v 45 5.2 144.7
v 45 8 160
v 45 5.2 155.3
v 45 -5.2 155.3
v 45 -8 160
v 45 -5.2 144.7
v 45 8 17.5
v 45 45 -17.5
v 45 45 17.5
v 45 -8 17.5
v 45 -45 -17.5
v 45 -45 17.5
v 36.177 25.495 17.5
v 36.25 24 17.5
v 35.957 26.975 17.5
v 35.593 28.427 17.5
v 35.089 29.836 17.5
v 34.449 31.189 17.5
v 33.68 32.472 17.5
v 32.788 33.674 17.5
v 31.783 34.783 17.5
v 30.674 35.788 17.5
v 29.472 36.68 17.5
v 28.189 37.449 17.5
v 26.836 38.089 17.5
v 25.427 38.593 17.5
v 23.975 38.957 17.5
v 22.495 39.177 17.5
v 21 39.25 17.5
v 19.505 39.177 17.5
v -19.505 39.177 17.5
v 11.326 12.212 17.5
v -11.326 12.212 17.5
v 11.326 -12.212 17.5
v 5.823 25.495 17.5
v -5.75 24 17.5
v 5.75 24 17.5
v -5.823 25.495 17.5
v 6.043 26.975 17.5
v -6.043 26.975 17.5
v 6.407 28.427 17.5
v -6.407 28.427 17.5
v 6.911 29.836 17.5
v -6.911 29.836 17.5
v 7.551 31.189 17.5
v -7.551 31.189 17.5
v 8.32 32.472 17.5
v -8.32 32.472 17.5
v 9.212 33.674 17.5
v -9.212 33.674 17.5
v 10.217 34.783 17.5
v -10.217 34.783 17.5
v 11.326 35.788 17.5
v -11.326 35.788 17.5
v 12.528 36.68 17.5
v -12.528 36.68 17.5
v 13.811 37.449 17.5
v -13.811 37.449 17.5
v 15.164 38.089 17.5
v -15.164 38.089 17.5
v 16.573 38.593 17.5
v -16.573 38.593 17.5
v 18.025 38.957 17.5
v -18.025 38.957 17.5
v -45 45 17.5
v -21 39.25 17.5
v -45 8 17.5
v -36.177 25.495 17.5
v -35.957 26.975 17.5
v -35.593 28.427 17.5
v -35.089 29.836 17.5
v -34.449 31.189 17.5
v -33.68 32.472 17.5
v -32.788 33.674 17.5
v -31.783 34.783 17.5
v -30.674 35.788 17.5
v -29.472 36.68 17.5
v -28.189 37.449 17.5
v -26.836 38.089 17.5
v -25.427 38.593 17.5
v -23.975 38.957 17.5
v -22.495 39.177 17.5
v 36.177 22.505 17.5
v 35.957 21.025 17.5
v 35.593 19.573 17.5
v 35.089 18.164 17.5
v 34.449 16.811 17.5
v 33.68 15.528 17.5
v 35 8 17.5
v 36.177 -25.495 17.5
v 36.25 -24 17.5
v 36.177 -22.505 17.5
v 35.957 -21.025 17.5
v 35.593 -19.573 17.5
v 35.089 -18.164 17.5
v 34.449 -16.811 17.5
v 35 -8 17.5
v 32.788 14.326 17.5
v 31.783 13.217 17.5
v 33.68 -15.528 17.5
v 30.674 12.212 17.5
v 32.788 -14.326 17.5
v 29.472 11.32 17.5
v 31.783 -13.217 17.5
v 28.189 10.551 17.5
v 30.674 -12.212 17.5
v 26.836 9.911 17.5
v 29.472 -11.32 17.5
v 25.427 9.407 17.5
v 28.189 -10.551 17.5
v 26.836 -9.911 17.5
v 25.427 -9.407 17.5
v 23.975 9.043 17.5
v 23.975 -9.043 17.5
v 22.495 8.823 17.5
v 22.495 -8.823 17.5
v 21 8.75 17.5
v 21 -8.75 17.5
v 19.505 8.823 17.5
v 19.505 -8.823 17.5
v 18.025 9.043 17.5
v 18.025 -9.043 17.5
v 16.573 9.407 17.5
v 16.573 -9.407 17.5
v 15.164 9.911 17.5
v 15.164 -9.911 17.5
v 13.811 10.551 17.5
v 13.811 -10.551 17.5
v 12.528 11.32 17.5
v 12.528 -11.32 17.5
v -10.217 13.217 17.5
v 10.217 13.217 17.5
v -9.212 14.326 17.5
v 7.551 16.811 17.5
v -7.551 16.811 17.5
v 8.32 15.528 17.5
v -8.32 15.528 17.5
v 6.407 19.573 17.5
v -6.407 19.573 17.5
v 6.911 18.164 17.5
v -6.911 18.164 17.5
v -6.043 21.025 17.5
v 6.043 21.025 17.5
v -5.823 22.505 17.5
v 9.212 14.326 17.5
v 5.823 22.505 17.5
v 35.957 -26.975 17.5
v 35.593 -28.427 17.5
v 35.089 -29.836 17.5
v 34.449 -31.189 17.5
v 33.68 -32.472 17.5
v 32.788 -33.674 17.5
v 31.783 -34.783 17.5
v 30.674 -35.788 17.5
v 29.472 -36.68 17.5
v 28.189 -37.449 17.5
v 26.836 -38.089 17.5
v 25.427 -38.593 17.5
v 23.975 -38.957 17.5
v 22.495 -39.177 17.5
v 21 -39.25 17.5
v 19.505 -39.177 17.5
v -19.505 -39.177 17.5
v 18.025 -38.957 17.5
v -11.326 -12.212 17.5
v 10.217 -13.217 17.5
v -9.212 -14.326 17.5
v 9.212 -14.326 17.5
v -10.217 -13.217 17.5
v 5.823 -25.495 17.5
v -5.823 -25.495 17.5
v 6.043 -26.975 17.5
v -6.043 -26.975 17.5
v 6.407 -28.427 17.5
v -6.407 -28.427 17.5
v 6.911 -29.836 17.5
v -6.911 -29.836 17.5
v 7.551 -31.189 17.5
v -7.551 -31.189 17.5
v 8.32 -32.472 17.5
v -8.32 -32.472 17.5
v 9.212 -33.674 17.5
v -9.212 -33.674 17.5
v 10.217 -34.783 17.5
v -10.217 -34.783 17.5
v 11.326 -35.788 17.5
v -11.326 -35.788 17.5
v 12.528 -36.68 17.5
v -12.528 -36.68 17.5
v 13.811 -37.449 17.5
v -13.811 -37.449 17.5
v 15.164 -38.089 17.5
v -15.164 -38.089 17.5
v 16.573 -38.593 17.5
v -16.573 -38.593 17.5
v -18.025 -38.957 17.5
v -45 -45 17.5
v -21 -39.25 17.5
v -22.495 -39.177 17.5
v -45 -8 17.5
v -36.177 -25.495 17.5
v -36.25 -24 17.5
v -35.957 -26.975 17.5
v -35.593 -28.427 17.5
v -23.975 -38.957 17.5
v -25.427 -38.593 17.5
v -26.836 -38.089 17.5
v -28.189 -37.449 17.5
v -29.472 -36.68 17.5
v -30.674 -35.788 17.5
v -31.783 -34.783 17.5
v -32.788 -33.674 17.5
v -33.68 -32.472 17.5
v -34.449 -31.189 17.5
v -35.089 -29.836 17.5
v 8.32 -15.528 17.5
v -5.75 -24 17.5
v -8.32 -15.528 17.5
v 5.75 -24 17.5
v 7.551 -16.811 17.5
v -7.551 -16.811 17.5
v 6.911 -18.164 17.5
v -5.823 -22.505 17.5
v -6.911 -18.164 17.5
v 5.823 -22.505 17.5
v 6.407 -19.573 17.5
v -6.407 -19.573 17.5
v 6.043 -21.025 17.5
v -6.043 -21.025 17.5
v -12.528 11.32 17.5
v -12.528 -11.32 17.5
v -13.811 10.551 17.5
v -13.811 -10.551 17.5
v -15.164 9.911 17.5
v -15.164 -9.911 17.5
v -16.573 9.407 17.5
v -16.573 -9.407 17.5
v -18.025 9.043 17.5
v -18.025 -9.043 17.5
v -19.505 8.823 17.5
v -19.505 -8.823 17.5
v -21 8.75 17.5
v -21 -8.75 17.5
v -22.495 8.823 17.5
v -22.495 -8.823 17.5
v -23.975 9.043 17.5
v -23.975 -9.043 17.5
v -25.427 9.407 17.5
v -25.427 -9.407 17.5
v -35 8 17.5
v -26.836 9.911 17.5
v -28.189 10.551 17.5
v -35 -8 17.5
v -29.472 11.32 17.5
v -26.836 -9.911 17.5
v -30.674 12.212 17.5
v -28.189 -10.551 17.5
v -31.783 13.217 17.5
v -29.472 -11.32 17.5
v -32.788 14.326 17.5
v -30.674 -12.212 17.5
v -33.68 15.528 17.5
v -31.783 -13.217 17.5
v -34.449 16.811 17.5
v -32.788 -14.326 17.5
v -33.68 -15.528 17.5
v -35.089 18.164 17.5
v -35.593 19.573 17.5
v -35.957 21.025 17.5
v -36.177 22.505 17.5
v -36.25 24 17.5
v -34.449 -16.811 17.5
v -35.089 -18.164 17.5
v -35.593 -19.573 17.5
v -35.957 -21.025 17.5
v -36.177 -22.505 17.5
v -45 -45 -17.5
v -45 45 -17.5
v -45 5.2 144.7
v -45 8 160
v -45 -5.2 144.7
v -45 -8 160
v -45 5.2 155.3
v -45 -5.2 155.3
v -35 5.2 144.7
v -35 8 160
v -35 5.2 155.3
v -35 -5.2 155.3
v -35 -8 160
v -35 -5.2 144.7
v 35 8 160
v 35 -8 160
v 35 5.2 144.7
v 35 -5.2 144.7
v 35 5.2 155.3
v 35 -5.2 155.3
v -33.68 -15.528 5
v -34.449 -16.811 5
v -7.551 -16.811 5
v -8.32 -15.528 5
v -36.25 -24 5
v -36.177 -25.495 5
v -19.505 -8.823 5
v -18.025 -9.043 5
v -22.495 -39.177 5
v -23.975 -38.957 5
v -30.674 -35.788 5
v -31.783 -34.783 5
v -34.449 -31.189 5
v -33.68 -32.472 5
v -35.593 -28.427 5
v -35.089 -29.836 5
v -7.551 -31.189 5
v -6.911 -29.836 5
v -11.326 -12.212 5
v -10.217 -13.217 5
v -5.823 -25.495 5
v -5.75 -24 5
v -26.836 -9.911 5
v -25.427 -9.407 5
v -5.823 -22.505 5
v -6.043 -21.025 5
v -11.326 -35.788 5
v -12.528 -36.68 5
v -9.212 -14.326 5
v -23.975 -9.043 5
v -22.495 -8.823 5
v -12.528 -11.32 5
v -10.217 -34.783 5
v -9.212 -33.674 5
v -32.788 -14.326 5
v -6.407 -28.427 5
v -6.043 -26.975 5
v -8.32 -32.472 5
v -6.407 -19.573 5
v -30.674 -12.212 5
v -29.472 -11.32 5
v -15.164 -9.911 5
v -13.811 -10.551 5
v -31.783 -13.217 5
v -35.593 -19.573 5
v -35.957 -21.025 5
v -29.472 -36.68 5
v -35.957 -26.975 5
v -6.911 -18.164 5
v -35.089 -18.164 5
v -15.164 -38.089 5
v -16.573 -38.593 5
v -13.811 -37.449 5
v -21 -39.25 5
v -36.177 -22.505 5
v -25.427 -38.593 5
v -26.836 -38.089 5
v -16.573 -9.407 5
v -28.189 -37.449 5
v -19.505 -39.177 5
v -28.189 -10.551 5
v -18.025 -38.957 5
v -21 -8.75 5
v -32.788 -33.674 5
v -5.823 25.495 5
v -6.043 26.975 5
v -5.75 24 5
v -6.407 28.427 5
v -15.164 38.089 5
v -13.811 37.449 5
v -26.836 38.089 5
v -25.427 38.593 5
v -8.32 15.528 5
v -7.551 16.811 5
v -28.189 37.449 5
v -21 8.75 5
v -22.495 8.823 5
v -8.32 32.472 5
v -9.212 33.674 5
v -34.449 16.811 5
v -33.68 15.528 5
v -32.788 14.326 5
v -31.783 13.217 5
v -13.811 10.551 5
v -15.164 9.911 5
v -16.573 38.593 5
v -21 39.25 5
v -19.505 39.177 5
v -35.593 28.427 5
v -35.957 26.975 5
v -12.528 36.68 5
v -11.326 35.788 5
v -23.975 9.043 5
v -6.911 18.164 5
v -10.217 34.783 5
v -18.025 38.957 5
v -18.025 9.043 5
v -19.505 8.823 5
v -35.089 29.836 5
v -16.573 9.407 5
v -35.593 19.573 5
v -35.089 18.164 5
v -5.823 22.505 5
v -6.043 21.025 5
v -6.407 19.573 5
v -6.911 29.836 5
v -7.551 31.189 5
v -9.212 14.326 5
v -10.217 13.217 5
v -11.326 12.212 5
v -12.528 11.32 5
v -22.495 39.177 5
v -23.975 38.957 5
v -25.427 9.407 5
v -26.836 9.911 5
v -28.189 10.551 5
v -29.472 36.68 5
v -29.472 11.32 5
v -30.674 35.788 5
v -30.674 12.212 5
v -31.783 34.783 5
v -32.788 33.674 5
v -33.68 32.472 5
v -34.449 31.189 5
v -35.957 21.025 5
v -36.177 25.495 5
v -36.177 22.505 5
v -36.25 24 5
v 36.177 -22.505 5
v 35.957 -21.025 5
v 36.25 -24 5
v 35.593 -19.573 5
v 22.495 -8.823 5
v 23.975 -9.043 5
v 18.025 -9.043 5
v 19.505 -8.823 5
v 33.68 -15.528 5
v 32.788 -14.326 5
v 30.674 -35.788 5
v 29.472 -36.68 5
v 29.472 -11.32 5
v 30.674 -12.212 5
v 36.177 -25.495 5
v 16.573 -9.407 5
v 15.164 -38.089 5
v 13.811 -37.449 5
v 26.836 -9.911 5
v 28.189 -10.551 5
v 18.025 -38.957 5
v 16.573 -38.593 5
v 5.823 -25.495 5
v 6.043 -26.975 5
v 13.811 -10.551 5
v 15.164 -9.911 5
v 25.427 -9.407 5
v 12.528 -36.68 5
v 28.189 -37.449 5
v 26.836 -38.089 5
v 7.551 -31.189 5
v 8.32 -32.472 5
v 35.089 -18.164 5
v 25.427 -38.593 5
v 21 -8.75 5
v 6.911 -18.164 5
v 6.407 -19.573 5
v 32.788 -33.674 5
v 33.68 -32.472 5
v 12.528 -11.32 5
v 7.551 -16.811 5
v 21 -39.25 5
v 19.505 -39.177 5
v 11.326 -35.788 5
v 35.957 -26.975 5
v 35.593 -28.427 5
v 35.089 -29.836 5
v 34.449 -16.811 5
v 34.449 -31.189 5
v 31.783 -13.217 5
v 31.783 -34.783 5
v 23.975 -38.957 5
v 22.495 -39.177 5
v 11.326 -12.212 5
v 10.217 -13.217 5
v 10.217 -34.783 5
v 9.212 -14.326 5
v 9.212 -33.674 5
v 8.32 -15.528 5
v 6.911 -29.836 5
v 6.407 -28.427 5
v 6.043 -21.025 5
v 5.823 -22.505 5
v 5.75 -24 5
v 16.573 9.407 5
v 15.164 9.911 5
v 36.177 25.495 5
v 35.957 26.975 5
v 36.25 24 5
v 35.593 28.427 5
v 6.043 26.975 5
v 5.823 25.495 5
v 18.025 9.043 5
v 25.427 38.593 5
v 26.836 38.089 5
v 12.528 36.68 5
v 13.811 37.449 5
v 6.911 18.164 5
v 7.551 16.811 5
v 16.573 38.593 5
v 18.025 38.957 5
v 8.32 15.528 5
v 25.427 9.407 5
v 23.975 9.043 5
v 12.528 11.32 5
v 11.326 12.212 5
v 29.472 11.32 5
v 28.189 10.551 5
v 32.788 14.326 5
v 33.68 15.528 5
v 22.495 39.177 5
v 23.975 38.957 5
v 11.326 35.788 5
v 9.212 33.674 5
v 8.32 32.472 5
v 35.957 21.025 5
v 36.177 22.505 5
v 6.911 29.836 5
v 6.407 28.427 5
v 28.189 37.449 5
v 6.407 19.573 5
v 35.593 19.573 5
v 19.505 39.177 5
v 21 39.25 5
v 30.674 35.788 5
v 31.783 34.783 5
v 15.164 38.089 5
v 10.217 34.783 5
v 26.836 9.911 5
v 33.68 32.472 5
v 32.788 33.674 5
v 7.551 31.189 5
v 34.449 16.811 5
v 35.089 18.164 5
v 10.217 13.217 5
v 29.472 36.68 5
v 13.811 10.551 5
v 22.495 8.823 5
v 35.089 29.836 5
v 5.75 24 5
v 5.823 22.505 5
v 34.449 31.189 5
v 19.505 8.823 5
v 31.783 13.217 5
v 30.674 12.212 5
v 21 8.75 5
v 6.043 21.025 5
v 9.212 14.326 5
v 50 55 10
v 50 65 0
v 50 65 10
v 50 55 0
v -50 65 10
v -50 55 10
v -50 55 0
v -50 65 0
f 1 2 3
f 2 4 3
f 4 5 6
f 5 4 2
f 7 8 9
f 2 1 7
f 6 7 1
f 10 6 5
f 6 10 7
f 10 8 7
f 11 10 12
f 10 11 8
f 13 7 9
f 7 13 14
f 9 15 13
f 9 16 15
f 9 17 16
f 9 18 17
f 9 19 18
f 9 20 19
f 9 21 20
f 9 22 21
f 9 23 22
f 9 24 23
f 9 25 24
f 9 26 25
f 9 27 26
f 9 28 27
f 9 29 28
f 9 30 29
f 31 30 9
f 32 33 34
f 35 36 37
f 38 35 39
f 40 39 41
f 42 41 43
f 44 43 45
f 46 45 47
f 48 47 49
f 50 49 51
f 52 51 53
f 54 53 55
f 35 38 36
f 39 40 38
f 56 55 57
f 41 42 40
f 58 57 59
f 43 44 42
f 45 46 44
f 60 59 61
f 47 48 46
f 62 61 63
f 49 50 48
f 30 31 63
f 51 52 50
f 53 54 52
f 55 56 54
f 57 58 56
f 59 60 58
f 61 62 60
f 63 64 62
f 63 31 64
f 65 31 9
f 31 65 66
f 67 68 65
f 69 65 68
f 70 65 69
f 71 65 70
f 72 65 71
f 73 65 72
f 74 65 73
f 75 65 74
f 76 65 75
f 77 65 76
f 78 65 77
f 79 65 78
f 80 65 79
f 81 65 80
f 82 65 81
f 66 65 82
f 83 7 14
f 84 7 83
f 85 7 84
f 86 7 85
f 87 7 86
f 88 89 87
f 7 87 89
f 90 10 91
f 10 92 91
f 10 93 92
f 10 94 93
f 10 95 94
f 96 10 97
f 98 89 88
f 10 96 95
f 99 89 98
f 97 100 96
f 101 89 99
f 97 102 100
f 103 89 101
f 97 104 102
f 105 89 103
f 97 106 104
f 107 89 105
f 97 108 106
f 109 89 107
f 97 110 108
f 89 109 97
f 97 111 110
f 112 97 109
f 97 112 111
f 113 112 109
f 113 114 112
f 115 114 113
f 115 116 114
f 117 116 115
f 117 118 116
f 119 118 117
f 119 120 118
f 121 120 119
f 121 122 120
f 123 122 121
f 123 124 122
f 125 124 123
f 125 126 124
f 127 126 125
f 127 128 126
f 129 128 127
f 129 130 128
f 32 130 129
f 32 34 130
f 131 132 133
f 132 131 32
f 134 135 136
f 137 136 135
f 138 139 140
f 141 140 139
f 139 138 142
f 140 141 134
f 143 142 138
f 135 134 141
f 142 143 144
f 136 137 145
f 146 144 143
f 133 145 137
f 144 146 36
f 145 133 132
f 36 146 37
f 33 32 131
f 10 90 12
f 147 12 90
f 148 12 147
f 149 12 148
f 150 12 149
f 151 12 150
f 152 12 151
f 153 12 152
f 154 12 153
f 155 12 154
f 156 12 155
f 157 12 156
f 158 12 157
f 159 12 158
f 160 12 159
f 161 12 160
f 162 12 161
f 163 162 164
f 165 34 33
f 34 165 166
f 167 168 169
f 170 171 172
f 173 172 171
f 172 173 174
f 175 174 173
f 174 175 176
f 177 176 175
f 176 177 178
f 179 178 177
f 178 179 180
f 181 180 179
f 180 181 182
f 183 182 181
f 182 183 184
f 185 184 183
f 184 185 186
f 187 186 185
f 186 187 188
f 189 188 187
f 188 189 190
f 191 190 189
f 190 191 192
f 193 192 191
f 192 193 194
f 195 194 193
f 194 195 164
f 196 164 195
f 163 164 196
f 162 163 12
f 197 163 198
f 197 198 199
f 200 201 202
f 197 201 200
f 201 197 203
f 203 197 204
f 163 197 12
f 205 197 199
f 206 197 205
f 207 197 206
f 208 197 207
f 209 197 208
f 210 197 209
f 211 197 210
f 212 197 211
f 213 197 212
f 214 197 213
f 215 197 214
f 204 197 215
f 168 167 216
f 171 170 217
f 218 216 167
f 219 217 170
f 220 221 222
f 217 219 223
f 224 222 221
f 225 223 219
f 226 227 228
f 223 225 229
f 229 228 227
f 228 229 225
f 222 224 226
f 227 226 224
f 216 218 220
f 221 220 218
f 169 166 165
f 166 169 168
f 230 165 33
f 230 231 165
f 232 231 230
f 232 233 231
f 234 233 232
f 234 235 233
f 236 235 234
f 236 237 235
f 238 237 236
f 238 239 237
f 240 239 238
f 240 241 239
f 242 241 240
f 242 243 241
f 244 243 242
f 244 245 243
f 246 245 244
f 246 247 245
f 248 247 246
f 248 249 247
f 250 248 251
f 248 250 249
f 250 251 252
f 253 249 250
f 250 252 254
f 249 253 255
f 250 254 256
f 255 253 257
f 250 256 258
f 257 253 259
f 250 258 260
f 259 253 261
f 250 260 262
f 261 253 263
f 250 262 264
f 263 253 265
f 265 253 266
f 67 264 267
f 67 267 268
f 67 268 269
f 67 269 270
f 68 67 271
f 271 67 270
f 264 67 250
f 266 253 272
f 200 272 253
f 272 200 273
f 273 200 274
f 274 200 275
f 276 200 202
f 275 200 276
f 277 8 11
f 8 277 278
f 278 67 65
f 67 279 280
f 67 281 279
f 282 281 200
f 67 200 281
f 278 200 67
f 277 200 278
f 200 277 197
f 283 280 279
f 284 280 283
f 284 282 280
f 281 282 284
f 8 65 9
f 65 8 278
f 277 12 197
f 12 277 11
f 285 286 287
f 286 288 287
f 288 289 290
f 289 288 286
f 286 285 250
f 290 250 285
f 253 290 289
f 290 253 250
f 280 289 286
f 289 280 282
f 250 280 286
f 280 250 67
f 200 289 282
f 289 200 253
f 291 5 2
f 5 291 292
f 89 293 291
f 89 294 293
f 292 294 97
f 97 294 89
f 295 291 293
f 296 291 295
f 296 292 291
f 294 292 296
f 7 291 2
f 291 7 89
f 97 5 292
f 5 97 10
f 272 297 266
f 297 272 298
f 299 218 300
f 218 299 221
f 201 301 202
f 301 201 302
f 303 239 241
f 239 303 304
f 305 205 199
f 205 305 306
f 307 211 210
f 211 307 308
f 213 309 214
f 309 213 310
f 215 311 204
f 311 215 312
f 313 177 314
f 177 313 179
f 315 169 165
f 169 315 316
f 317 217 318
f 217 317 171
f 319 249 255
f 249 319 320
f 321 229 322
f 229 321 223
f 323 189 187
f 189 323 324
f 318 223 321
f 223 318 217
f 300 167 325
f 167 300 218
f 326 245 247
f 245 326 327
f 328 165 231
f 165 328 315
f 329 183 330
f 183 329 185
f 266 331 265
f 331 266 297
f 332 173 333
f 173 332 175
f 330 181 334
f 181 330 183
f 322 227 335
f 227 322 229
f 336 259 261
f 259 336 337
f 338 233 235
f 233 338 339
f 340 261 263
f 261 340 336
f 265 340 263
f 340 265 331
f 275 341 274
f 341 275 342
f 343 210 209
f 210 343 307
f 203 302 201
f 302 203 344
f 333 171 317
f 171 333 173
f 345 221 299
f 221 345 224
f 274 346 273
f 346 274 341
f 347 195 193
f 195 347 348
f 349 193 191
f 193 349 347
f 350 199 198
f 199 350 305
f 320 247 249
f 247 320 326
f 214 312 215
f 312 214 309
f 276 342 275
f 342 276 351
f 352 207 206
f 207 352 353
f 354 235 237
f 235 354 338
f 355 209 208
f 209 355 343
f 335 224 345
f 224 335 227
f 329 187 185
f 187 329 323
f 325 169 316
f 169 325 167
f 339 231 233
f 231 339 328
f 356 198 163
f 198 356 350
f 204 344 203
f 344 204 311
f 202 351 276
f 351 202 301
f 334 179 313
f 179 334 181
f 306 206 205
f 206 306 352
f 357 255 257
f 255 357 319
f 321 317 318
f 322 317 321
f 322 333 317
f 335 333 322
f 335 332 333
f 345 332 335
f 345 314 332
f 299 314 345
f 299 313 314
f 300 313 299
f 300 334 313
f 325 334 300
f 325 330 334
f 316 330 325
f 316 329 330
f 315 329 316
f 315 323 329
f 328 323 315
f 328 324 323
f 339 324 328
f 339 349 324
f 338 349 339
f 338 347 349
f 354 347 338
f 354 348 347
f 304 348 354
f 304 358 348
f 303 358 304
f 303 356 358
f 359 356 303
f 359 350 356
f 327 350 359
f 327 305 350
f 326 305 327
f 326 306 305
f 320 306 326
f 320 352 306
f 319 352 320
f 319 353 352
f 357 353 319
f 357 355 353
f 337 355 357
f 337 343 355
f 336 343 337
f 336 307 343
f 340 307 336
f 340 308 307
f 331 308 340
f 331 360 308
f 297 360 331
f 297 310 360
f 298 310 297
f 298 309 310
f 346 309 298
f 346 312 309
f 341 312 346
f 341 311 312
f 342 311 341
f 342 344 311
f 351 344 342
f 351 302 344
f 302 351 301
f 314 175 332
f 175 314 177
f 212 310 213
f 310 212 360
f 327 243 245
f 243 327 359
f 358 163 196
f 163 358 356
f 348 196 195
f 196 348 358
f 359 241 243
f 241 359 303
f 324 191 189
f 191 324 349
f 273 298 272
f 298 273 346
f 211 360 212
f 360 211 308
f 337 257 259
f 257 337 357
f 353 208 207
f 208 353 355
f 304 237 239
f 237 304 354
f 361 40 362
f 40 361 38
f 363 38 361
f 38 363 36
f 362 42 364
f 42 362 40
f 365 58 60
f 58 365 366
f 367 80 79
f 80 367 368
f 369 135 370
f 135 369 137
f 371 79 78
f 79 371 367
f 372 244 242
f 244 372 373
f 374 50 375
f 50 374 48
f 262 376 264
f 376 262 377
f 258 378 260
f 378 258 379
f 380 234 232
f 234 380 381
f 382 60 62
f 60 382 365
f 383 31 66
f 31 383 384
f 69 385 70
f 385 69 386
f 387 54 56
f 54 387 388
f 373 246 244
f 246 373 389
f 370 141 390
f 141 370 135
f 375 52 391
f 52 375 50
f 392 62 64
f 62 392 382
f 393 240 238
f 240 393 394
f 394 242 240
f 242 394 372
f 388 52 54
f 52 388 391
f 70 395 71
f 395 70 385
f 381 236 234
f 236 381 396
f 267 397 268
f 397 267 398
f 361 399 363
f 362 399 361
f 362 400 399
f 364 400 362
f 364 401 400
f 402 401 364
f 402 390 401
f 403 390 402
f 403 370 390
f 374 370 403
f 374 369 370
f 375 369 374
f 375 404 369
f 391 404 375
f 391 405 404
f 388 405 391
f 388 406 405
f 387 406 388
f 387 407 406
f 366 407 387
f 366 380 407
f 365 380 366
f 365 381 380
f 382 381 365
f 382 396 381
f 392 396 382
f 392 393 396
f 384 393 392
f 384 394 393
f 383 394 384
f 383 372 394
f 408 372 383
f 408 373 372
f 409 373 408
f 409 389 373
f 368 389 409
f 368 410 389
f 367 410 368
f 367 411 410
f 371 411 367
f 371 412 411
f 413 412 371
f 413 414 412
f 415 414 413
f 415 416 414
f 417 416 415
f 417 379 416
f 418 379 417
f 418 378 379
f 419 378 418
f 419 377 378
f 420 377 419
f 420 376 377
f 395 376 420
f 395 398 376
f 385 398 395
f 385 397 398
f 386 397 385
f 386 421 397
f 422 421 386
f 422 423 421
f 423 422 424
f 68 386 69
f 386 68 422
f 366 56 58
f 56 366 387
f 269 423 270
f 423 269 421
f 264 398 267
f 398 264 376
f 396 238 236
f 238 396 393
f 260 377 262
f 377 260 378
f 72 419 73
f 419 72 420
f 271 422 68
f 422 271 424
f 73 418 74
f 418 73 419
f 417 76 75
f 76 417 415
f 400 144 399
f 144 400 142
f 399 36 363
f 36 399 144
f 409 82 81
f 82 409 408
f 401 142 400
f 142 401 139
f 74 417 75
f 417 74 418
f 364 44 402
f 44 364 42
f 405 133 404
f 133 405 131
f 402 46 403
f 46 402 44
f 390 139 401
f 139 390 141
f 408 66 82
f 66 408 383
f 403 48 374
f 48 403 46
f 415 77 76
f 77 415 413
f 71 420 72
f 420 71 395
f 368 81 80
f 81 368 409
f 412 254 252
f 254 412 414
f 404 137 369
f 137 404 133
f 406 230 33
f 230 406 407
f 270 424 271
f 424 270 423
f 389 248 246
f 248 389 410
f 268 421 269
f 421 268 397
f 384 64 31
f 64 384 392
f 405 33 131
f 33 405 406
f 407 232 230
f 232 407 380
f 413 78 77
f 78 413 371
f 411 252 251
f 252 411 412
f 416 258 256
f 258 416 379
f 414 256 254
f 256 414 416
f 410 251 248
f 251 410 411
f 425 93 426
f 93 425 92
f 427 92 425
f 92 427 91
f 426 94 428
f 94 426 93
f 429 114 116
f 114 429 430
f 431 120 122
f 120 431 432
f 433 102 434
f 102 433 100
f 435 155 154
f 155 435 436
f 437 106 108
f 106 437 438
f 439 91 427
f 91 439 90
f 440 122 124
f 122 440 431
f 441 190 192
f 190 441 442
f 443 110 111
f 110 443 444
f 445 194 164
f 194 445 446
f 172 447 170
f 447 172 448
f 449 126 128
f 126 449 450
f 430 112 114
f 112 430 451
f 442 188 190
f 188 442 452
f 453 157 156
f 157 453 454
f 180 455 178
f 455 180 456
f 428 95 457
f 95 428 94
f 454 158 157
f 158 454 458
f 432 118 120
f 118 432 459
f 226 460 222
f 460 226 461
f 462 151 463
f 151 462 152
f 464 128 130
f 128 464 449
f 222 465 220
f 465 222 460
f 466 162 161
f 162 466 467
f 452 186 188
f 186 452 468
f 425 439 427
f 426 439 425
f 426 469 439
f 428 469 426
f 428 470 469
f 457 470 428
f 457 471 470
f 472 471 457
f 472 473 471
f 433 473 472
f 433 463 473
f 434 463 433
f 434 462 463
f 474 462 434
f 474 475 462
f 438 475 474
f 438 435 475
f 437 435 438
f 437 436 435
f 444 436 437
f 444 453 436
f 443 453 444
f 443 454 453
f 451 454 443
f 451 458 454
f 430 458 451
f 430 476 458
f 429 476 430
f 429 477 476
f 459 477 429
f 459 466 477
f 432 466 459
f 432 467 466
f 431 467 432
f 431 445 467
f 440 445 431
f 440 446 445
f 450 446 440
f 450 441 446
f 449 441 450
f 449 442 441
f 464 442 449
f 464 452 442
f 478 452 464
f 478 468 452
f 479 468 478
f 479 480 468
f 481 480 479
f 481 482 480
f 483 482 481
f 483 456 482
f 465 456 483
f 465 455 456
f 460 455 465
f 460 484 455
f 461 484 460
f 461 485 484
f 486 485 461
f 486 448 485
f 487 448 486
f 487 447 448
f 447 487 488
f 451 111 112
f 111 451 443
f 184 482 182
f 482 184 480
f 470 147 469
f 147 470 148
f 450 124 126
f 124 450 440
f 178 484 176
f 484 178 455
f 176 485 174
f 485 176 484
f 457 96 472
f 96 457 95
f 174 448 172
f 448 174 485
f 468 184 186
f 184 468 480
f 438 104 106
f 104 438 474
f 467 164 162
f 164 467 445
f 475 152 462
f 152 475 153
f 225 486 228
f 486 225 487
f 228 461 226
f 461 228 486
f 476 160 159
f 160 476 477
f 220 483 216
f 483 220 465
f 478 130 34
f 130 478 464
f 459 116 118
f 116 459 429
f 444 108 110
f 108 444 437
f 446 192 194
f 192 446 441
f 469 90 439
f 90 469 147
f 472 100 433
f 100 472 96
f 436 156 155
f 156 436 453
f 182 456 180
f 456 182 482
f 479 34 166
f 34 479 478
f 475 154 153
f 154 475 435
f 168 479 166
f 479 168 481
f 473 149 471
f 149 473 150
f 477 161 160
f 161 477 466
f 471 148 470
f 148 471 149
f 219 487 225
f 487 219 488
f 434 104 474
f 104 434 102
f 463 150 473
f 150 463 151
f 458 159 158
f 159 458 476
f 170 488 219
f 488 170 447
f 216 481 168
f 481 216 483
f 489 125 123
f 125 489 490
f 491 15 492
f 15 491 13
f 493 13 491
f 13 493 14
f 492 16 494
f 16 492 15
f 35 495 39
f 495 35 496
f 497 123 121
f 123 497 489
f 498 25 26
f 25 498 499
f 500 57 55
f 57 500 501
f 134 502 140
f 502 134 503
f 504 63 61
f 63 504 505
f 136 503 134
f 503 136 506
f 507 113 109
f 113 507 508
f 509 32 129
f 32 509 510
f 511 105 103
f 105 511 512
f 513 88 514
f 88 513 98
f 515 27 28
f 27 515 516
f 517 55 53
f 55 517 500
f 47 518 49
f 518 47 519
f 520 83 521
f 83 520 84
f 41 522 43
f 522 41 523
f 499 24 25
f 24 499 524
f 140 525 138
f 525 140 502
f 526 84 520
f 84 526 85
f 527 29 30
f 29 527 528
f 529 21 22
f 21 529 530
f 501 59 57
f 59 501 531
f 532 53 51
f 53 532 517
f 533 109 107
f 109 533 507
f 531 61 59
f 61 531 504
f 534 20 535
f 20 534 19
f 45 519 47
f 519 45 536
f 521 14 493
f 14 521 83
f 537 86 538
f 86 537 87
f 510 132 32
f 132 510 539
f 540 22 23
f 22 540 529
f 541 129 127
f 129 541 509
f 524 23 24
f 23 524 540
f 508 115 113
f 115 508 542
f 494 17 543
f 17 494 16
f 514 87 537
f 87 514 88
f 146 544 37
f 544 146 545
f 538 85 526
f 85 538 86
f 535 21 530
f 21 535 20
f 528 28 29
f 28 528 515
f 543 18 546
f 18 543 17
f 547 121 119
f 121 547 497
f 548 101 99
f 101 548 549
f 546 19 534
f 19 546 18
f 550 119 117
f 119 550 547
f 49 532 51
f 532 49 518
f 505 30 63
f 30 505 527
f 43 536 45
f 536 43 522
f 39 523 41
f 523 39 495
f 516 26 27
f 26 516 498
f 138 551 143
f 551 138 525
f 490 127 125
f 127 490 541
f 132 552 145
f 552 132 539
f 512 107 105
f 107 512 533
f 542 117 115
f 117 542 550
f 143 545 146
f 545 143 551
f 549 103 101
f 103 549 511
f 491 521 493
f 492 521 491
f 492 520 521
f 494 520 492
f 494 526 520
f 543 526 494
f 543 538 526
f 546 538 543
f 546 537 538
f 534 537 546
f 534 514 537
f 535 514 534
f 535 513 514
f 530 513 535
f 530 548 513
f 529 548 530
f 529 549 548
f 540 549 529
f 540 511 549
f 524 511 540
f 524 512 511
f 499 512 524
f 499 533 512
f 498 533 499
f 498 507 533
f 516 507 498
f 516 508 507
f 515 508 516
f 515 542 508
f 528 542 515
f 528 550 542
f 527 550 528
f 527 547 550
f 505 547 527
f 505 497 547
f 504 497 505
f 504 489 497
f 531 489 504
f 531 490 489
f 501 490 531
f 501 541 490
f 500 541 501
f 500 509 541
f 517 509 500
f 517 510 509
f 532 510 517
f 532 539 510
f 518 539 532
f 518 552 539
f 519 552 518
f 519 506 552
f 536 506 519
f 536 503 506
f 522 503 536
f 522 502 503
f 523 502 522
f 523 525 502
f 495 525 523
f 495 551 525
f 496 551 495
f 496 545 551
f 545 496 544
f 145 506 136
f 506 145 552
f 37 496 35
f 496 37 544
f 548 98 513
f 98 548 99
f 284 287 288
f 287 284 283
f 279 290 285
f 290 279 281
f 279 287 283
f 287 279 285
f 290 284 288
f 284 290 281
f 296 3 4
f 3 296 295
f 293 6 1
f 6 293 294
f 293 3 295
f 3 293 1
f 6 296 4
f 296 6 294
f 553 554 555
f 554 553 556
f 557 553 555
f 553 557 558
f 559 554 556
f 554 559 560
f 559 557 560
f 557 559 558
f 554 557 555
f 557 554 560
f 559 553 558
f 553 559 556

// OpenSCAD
// Dimensions
base_x = 90;         // X dimension of base
base_y = 90;         // Y dimension of base
base_z = 35;         // Z dimension (height) of base
post_thickness_x = 10;  // X thickness of posts
post_width_y = 16;   // Y width of posts
post_height_z = 160; // Z height of posts
seat_diameter = 30.5; // Diameter of conical tube seats
seat_depth = 30;     // Depth of blind seats
seat_x1 = -21;       // X position of first two seats
seat_x2 = 21;        // X position of second two seats
seat_y1 = -24;       // Y position of first pair of seats
seat_y2 = 24;        // Y position of second pair of seats
hole_size = 10.4;    // Size of square holes through posts
hole_z_center = 150; // Z center of holes through posts
handle_x = 100;      // X length of handle bar
handle_y = 10;       // Y width of handle bar
handle_z = 10;       // Z height of handle bar
handle_y_pos = 60;   // Y position of handle bar center

// Part 1: Base block with posts
difference() {
  union() {
    // Base block: 90 x 90 x 35 mm, centered at origin
    cube([base_x, base_y, base_z], center=true);
    
    // Left post: 10 x 16 x 160 mm at left end
    translate([-45, -8, 0]) cube([post_thickness_x, post_width_y, post_height_z]);
    
    // Right post: 10 x 16 x 160 mm at right end
    translate([35, -8, 0]) cube([post_thickness_x, post_width_y, post_height_z]);
  }
  
  // Blind seats for conical tubes: 30.5 mm diameter, 30 mm deep
  for (x = [seat_x1, seat_x2]) {
    for (y = [seat_y1, seat_y2]) {
      translate([x, y, 5]) {
        cylinder(h=seat_depth+0.1, d=seat_diameter, $fn=64);
      }
    }
  }
  
  // Holes through posts: 10.4 x 10.4 mm square, straight through along X
  // Left post hole
  translate([-46, -5.2, hole_z_center - hole_size/2 - 0.1]) {
    cube([12, hole_size, hole_size + 0.2]);
  }
  
  // Right post hole
  translate([34, -5.2, hole_z_center - hole_size/2 - 0.1]) {
    cube([12, hole_size, hole_size + 0.2]);
  }
}

// Part 2: Handle bar: 10 x 10 mm square, 100 mm long, lying on bed
translate([0, handle_y_pos, 5]) {
  cube([handle_x, handle_y, handle_z], center=true);
}
